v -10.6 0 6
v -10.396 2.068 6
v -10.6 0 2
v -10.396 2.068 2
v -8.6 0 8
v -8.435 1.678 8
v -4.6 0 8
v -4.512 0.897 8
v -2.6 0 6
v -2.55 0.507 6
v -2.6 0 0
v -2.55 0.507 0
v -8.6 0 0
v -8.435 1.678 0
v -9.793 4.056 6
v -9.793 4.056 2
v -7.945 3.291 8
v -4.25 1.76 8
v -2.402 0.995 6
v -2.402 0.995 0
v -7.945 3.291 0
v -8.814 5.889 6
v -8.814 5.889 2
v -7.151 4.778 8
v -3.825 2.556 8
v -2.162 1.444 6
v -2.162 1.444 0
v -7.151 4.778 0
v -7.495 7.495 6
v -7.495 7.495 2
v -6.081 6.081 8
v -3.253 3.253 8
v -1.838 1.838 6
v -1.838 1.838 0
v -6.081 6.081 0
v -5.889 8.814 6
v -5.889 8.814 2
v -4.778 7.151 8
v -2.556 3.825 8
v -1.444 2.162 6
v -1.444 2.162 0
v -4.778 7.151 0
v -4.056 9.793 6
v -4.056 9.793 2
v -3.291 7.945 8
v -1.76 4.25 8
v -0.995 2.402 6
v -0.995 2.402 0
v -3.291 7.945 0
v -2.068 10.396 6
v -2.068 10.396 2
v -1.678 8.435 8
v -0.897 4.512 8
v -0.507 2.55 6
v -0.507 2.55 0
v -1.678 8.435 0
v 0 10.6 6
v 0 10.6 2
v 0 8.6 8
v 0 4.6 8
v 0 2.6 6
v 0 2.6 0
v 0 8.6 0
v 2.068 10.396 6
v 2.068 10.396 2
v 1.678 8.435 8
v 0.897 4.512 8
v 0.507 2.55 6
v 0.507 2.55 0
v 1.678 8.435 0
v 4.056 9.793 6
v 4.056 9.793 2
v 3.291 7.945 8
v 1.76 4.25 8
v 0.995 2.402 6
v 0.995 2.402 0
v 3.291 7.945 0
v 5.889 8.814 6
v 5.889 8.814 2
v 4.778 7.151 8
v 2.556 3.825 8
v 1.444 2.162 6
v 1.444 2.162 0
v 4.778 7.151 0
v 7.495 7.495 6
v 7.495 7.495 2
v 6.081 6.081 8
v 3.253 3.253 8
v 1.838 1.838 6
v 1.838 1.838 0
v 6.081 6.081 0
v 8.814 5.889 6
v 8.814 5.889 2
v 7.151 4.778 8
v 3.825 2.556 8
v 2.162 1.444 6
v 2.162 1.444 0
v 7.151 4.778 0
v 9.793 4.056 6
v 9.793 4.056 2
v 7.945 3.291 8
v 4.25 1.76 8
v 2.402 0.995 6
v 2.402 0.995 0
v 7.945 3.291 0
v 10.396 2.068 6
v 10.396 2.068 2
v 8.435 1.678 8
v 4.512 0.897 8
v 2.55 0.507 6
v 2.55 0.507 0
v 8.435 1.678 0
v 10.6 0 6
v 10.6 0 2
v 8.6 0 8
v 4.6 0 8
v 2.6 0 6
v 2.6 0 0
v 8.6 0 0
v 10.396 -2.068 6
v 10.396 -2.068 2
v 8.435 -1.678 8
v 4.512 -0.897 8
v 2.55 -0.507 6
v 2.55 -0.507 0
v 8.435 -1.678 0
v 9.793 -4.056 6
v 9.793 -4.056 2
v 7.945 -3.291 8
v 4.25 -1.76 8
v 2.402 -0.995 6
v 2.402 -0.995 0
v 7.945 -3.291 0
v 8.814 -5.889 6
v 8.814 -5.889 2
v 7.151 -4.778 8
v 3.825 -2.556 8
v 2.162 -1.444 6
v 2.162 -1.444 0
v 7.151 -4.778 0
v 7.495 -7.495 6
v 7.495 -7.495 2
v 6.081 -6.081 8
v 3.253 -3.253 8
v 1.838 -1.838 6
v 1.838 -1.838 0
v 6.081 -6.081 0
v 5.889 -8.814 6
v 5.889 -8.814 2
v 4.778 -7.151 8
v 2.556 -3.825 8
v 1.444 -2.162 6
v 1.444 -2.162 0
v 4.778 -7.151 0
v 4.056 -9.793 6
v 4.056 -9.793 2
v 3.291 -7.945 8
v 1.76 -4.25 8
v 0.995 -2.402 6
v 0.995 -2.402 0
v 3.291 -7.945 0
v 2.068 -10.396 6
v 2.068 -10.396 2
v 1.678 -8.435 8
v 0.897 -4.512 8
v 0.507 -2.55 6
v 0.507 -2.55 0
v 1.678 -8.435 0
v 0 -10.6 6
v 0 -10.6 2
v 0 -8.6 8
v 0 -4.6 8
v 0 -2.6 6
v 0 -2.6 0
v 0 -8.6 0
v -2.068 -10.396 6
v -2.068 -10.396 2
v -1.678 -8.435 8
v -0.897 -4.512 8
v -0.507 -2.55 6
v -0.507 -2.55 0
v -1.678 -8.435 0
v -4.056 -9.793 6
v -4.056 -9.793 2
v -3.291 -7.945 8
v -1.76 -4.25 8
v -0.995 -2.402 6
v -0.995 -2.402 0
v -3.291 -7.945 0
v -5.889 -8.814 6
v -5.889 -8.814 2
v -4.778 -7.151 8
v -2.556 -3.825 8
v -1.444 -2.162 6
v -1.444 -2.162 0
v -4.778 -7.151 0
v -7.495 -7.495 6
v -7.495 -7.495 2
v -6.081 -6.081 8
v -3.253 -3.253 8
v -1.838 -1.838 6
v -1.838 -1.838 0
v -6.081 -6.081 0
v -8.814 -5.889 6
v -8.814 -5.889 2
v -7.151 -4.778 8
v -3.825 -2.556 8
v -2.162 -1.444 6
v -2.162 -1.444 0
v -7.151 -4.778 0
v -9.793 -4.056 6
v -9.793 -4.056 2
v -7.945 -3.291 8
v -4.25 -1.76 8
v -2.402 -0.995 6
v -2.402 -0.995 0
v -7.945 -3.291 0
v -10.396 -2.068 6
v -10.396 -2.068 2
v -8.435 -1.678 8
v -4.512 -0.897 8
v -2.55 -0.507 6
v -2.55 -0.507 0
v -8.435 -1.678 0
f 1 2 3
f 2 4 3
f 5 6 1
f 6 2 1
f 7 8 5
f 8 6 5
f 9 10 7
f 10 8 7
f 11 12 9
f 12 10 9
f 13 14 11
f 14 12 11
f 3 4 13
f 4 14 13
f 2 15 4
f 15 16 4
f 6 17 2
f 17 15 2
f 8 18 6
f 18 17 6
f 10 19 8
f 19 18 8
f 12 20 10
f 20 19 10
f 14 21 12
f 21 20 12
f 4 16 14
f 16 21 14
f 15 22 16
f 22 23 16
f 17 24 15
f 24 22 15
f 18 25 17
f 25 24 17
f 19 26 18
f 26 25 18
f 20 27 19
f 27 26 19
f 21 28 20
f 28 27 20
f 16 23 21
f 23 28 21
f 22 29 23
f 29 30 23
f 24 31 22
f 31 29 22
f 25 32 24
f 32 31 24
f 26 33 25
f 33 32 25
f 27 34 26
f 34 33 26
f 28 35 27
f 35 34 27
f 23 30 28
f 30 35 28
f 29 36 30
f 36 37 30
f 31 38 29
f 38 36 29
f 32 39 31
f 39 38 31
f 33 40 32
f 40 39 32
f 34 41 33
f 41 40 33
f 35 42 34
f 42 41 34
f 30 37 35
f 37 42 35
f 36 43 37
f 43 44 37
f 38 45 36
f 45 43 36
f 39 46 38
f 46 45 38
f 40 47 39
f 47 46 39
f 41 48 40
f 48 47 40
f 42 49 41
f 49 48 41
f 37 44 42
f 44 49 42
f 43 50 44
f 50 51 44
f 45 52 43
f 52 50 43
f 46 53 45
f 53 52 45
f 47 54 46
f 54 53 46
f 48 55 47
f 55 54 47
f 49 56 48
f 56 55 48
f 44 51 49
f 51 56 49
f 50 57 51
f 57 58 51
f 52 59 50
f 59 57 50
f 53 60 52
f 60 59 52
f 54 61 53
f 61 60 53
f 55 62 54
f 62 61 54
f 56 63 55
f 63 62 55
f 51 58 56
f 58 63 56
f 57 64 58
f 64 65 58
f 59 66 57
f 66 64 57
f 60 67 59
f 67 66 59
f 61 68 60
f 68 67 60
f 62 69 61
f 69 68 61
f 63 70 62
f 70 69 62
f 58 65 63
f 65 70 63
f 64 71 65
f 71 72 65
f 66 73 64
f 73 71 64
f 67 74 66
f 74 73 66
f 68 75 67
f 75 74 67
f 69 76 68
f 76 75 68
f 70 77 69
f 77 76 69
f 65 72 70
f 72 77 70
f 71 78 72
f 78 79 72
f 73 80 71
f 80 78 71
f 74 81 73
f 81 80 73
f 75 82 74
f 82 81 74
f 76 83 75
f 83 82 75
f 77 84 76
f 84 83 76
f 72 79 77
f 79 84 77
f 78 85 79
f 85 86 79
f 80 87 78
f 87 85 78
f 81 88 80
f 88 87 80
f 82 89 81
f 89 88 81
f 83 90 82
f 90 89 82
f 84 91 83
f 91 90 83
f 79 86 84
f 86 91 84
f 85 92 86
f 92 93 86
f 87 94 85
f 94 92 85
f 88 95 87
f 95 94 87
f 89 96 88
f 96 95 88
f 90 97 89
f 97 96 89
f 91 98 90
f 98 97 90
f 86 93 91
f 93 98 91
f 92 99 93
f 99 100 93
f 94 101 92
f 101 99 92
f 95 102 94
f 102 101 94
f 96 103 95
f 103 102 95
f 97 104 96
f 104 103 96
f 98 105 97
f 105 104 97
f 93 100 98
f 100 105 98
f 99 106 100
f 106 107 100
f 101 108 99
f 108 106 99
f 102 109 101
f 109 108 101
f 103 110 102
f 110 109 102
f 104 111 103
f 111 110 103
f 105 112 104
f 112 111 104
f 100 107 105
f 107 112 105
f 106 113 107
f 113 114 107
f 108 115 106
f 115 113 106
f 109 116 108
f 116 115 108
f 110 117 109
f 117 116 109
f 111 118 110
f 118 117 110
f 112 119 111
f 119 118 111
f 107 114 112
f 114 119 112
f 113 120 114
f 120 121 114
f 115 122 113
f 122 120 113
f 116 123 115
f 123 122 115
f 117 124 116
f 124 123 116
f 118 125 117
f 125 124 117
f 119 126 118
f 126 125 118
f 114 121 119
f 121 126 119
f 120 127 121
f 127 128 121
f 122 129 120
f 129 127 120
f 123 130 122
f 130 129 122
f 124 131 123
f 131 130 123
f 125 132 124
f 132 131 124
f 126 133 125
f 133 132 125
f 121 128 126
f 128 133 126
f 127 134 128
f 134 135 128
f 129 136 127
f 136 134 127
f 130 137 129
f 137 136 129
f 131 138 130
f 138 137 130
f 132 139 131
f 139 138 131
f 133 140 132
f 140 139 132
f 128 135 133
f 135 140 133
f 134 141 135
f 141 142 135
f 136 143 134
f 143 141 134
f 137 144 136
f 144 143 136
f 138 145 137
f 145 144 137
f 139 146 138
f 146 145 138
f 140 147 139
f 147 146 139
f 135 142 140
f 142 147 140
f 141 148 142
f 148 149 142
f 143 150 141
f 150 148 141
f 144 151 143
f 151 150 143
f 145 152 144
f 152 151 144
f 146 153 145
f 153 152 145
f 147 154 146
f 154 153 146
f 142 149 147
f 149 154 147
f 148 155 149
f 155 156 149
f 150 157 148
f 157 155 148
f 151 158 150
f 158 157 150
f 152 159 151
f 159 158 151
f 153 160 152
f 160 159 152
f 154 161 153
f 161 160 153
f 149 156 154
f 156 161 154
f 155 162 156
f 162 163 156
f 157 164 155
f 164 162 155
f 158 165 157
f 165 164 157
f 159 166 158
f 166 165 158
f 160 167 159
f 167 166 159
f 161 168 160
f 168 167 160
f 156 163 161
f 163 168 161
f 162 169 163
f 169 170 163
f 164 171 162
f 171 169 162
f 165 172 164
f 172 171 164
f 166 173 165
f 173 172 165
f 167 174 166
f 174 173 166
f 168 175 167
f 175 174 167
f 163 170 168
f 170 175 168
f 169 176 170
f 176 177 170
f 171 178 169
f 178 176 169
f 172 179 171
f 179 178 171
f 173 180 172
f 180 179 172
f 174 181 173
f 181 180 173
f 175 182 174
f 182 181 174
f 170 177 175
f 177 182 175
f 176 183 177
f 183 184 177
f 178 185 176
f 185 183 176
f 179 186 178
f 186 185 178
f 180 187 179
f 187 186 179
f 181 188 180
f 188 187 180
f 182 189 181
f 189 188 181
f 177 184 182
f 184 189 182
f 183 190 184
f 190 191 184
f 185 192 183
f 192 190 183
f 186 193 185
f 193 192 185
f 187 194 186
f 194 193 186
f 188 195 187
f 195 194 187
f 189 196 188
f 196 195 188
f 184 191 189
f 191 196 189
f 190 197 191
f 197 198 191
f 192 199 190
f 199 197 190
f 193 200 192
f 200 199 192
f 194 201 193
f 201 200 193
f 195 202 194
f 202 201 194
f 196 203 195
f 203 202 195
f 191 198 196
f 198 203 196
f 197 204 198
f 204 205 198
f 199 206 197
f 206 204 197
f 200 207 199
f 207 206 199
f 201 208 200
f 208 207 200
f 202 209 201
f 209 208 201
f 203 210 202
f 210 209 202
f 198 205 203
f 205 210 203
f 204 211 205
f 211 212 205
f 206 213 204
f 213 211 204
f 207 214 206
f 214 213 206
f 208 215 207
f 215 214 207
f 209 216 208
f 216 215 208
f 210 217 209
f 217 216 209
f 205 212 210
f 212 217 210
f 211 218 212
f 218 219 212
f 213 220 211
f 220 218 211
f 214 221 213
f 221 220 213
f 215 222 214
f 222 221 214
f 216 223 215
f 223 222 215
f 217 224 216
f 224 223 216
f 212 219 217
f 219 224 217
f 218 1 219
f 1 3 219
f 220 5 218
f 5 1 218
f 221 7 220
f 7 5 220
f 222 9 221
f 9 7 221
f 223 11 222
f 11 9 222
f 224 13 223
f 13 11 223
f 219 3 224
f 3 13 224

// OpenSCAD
$fn = 32;

// ----------------------------------------------------------------------
// Form washer: chamfered washer, 21.2 mm outside, 5.2 mm bore
// ----------------------------------------------------------------------

// --- parameters (mm) ---
revolve_angle = 360;      // full turn around the Z axis
profile_points = 7;       // points of the closed outline

profile = [[2.6, 0], [8.6, 0], [10.6, 2], [10.6, 6], [8.6, 8], [4.6, 8], [2.6, 6]];  // single closed polygon, 7 points, counter clockwise

// --- the one profile operation ---
rotate_extrude(angle = revolve_angle) polygon(points = profile);
